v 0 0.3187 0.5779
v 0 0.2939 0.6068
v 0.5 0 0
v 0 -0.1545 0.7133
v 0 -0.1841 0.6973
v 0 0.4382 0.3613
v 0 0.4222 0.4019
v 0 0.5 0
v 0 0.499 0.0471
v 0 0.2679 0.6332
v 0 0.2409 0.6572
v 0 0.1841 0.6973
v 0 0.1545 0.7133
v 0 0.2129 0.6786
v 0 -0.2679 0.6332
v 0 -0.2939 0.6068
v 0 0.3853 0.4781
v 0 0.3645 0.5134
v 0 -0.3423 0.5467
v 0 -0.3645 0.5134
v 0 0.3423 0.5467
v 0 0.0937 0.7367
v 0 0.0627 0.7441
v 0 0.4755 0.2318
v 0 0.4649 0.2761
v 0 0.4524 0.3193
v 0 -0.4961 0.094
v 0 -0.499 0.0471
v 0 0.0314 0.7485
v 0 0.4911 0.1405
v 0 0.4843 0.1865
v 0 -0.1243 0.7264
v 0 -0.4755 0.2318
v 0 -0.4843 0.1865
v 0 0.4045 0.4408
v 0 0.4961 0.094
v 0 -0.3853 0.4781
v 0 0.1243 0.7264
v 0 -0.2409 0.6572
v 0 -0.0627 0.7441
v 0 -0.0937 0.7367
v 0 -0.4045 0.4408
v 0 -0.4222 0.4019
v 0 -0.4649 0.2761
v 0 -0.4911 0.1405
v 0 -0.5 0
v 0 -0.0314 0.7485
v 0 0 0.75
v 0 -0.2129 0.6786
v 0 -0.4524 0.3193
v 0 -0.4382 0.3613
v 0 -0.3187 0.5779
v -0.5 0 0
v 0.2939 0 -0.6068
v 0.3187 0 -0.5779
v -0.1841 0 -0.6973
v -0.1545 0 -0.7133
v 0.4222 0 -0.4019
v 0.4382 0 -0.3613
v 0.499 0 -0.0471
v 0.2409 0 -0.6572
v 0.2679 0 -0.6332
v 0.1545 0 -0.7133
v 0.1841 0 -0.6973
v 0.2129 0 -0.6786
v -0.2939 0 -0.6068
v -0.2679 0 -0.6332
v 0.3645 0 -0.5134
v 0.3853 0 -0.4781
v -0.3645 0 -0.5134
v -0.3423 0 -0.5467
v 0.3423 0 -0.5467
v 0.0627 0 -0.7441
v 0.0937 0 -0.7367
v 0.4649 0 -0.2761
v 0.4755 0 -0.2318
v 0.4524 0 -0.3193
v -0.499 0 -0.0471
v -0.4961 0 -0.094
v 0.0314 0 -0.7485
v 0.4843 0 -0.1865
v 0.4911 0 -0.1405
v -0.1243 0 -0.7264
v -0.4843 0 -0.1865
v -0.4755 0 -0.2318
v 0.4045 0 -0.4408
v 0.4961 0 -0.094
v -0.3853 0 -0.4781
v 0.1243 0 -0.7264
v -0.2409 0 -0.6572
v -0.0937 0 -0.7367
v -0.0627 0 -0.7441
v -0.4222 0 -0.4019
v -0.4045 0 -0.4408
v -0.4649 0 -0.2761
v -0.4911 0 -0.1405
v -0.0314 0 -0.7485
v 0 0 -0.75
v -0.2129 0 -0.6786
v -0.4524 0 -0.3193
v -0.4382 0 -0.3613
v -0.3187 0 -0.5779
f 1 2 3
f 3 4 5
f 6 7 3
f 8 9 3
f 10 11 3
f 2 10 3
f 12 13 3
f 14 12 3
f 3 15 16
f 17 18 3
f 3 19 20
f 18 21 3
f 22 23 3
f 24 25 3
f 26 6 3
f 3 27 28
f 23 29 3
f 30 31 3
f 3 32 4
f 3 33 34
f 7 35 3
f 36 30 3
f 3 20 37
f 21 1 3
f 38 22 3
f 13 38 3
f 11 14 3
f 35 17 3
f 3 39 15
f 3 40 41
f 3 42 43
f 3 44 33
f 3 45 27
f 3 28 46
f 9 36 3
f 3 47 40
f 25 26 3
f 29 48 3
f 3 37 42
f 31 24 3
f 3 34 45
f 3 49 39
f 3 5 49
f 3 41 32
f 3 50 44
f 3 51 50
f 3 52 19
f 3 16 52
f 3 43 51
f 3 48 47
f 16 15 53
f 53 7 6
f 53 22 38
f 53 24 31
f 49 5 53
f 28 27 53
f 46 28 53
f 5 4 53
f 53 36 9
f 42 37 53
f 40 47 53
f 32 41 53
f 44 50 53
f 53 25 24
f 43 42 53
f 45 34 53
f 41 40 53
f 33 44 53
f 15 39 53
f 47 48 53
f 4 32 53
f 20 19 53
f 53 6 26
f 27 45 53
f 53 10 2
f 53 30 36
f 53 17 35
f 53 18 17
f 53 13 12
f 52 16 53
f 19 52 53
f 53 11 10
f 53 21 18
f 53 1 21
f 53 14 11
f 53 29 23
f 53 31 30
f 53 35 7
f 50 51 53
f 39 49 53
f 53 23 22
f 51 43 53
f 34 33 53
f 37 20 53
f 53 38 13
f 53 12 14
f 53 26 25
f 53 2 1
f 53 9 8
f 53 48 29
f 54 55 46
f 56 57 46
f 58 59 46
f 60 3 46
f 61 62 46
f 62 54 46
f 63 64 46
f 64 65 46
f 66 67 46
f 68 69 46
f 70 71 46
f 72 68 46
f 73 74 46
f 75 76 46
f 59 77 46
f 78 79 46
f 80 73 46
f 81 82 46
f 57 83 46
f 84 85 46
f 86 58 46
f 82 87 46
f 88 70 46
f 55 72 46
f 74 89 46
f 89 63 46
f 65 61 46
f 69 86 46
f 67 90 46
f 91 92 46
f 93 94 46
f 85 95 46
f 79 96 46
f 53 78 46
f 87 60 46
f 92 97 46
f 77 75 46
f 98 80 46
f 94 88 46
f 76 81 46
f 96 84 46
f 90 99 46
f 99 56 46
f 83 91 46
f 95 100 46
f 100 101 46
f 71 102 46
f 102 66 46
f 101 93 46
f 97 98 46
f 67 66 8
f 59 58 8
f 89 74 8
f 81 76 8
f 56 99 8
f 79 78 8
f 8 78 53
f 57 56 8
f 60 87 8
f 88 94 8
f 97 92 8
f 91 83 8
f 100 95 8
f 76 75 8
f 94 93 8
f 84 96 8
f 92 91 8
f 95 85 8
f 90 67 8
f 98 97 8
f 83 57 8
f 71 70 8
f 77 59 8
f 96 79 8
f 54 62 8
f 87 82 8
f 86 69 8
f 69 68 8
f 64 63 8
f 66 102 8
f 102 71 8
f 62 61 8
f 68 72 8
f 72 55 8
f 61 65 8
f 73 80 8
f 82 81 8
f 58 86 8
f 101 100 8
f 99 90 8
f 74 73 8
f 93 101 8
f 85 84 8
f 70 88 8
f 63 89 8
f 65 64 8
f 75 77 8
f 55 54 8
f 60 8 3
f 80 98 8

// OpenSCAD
// Customizable Sphericon Dimensions
total_length = 1.5;  // The length of the sphericon (Originally along X)
total_height = 1.0;  // The diameter of the sphericon

// Internal Settings
$fn = 100;           // Smoothness
base_size = 10;      // Arbitrary base unit for calculation

module standard_sphericon() {
    r = base_size / 2;
    // Part A: First half of bicone
    intersection() {
        union() {
            cylinder(r1=r, r2=0, h=r);
            mirror([0,0,1]) cylinder(r1=r, r2=0, h=r);
        }
        translate([-r, -r, -r]) cube([r, r*2, r*2]);
    }
    
    // Part B: Second half (rotated 90 deg relative to Part A)
    rotate([90, 0, 0]) 
    mirror([1,0,0]) 
    intersection() {
        union() {
            cylinder(r1=r, r2=0, h=r);
            mirror([0,0,1]) cylinder(r1=r, r2=0, h=r);
        }
        translate([-r, -r, -r]) cube([r, r*2, r*2]);
    }
}

// FINAL GENERATION STEPS
// 1. Scale to requested dimensions
// 2. Rotate 90 degrees around Y axis
rotate([0, 90, 0]) 
    scale([total_length/base_size, total_height/base_size, total_height/base_size]) 
    standard_sphericon();
